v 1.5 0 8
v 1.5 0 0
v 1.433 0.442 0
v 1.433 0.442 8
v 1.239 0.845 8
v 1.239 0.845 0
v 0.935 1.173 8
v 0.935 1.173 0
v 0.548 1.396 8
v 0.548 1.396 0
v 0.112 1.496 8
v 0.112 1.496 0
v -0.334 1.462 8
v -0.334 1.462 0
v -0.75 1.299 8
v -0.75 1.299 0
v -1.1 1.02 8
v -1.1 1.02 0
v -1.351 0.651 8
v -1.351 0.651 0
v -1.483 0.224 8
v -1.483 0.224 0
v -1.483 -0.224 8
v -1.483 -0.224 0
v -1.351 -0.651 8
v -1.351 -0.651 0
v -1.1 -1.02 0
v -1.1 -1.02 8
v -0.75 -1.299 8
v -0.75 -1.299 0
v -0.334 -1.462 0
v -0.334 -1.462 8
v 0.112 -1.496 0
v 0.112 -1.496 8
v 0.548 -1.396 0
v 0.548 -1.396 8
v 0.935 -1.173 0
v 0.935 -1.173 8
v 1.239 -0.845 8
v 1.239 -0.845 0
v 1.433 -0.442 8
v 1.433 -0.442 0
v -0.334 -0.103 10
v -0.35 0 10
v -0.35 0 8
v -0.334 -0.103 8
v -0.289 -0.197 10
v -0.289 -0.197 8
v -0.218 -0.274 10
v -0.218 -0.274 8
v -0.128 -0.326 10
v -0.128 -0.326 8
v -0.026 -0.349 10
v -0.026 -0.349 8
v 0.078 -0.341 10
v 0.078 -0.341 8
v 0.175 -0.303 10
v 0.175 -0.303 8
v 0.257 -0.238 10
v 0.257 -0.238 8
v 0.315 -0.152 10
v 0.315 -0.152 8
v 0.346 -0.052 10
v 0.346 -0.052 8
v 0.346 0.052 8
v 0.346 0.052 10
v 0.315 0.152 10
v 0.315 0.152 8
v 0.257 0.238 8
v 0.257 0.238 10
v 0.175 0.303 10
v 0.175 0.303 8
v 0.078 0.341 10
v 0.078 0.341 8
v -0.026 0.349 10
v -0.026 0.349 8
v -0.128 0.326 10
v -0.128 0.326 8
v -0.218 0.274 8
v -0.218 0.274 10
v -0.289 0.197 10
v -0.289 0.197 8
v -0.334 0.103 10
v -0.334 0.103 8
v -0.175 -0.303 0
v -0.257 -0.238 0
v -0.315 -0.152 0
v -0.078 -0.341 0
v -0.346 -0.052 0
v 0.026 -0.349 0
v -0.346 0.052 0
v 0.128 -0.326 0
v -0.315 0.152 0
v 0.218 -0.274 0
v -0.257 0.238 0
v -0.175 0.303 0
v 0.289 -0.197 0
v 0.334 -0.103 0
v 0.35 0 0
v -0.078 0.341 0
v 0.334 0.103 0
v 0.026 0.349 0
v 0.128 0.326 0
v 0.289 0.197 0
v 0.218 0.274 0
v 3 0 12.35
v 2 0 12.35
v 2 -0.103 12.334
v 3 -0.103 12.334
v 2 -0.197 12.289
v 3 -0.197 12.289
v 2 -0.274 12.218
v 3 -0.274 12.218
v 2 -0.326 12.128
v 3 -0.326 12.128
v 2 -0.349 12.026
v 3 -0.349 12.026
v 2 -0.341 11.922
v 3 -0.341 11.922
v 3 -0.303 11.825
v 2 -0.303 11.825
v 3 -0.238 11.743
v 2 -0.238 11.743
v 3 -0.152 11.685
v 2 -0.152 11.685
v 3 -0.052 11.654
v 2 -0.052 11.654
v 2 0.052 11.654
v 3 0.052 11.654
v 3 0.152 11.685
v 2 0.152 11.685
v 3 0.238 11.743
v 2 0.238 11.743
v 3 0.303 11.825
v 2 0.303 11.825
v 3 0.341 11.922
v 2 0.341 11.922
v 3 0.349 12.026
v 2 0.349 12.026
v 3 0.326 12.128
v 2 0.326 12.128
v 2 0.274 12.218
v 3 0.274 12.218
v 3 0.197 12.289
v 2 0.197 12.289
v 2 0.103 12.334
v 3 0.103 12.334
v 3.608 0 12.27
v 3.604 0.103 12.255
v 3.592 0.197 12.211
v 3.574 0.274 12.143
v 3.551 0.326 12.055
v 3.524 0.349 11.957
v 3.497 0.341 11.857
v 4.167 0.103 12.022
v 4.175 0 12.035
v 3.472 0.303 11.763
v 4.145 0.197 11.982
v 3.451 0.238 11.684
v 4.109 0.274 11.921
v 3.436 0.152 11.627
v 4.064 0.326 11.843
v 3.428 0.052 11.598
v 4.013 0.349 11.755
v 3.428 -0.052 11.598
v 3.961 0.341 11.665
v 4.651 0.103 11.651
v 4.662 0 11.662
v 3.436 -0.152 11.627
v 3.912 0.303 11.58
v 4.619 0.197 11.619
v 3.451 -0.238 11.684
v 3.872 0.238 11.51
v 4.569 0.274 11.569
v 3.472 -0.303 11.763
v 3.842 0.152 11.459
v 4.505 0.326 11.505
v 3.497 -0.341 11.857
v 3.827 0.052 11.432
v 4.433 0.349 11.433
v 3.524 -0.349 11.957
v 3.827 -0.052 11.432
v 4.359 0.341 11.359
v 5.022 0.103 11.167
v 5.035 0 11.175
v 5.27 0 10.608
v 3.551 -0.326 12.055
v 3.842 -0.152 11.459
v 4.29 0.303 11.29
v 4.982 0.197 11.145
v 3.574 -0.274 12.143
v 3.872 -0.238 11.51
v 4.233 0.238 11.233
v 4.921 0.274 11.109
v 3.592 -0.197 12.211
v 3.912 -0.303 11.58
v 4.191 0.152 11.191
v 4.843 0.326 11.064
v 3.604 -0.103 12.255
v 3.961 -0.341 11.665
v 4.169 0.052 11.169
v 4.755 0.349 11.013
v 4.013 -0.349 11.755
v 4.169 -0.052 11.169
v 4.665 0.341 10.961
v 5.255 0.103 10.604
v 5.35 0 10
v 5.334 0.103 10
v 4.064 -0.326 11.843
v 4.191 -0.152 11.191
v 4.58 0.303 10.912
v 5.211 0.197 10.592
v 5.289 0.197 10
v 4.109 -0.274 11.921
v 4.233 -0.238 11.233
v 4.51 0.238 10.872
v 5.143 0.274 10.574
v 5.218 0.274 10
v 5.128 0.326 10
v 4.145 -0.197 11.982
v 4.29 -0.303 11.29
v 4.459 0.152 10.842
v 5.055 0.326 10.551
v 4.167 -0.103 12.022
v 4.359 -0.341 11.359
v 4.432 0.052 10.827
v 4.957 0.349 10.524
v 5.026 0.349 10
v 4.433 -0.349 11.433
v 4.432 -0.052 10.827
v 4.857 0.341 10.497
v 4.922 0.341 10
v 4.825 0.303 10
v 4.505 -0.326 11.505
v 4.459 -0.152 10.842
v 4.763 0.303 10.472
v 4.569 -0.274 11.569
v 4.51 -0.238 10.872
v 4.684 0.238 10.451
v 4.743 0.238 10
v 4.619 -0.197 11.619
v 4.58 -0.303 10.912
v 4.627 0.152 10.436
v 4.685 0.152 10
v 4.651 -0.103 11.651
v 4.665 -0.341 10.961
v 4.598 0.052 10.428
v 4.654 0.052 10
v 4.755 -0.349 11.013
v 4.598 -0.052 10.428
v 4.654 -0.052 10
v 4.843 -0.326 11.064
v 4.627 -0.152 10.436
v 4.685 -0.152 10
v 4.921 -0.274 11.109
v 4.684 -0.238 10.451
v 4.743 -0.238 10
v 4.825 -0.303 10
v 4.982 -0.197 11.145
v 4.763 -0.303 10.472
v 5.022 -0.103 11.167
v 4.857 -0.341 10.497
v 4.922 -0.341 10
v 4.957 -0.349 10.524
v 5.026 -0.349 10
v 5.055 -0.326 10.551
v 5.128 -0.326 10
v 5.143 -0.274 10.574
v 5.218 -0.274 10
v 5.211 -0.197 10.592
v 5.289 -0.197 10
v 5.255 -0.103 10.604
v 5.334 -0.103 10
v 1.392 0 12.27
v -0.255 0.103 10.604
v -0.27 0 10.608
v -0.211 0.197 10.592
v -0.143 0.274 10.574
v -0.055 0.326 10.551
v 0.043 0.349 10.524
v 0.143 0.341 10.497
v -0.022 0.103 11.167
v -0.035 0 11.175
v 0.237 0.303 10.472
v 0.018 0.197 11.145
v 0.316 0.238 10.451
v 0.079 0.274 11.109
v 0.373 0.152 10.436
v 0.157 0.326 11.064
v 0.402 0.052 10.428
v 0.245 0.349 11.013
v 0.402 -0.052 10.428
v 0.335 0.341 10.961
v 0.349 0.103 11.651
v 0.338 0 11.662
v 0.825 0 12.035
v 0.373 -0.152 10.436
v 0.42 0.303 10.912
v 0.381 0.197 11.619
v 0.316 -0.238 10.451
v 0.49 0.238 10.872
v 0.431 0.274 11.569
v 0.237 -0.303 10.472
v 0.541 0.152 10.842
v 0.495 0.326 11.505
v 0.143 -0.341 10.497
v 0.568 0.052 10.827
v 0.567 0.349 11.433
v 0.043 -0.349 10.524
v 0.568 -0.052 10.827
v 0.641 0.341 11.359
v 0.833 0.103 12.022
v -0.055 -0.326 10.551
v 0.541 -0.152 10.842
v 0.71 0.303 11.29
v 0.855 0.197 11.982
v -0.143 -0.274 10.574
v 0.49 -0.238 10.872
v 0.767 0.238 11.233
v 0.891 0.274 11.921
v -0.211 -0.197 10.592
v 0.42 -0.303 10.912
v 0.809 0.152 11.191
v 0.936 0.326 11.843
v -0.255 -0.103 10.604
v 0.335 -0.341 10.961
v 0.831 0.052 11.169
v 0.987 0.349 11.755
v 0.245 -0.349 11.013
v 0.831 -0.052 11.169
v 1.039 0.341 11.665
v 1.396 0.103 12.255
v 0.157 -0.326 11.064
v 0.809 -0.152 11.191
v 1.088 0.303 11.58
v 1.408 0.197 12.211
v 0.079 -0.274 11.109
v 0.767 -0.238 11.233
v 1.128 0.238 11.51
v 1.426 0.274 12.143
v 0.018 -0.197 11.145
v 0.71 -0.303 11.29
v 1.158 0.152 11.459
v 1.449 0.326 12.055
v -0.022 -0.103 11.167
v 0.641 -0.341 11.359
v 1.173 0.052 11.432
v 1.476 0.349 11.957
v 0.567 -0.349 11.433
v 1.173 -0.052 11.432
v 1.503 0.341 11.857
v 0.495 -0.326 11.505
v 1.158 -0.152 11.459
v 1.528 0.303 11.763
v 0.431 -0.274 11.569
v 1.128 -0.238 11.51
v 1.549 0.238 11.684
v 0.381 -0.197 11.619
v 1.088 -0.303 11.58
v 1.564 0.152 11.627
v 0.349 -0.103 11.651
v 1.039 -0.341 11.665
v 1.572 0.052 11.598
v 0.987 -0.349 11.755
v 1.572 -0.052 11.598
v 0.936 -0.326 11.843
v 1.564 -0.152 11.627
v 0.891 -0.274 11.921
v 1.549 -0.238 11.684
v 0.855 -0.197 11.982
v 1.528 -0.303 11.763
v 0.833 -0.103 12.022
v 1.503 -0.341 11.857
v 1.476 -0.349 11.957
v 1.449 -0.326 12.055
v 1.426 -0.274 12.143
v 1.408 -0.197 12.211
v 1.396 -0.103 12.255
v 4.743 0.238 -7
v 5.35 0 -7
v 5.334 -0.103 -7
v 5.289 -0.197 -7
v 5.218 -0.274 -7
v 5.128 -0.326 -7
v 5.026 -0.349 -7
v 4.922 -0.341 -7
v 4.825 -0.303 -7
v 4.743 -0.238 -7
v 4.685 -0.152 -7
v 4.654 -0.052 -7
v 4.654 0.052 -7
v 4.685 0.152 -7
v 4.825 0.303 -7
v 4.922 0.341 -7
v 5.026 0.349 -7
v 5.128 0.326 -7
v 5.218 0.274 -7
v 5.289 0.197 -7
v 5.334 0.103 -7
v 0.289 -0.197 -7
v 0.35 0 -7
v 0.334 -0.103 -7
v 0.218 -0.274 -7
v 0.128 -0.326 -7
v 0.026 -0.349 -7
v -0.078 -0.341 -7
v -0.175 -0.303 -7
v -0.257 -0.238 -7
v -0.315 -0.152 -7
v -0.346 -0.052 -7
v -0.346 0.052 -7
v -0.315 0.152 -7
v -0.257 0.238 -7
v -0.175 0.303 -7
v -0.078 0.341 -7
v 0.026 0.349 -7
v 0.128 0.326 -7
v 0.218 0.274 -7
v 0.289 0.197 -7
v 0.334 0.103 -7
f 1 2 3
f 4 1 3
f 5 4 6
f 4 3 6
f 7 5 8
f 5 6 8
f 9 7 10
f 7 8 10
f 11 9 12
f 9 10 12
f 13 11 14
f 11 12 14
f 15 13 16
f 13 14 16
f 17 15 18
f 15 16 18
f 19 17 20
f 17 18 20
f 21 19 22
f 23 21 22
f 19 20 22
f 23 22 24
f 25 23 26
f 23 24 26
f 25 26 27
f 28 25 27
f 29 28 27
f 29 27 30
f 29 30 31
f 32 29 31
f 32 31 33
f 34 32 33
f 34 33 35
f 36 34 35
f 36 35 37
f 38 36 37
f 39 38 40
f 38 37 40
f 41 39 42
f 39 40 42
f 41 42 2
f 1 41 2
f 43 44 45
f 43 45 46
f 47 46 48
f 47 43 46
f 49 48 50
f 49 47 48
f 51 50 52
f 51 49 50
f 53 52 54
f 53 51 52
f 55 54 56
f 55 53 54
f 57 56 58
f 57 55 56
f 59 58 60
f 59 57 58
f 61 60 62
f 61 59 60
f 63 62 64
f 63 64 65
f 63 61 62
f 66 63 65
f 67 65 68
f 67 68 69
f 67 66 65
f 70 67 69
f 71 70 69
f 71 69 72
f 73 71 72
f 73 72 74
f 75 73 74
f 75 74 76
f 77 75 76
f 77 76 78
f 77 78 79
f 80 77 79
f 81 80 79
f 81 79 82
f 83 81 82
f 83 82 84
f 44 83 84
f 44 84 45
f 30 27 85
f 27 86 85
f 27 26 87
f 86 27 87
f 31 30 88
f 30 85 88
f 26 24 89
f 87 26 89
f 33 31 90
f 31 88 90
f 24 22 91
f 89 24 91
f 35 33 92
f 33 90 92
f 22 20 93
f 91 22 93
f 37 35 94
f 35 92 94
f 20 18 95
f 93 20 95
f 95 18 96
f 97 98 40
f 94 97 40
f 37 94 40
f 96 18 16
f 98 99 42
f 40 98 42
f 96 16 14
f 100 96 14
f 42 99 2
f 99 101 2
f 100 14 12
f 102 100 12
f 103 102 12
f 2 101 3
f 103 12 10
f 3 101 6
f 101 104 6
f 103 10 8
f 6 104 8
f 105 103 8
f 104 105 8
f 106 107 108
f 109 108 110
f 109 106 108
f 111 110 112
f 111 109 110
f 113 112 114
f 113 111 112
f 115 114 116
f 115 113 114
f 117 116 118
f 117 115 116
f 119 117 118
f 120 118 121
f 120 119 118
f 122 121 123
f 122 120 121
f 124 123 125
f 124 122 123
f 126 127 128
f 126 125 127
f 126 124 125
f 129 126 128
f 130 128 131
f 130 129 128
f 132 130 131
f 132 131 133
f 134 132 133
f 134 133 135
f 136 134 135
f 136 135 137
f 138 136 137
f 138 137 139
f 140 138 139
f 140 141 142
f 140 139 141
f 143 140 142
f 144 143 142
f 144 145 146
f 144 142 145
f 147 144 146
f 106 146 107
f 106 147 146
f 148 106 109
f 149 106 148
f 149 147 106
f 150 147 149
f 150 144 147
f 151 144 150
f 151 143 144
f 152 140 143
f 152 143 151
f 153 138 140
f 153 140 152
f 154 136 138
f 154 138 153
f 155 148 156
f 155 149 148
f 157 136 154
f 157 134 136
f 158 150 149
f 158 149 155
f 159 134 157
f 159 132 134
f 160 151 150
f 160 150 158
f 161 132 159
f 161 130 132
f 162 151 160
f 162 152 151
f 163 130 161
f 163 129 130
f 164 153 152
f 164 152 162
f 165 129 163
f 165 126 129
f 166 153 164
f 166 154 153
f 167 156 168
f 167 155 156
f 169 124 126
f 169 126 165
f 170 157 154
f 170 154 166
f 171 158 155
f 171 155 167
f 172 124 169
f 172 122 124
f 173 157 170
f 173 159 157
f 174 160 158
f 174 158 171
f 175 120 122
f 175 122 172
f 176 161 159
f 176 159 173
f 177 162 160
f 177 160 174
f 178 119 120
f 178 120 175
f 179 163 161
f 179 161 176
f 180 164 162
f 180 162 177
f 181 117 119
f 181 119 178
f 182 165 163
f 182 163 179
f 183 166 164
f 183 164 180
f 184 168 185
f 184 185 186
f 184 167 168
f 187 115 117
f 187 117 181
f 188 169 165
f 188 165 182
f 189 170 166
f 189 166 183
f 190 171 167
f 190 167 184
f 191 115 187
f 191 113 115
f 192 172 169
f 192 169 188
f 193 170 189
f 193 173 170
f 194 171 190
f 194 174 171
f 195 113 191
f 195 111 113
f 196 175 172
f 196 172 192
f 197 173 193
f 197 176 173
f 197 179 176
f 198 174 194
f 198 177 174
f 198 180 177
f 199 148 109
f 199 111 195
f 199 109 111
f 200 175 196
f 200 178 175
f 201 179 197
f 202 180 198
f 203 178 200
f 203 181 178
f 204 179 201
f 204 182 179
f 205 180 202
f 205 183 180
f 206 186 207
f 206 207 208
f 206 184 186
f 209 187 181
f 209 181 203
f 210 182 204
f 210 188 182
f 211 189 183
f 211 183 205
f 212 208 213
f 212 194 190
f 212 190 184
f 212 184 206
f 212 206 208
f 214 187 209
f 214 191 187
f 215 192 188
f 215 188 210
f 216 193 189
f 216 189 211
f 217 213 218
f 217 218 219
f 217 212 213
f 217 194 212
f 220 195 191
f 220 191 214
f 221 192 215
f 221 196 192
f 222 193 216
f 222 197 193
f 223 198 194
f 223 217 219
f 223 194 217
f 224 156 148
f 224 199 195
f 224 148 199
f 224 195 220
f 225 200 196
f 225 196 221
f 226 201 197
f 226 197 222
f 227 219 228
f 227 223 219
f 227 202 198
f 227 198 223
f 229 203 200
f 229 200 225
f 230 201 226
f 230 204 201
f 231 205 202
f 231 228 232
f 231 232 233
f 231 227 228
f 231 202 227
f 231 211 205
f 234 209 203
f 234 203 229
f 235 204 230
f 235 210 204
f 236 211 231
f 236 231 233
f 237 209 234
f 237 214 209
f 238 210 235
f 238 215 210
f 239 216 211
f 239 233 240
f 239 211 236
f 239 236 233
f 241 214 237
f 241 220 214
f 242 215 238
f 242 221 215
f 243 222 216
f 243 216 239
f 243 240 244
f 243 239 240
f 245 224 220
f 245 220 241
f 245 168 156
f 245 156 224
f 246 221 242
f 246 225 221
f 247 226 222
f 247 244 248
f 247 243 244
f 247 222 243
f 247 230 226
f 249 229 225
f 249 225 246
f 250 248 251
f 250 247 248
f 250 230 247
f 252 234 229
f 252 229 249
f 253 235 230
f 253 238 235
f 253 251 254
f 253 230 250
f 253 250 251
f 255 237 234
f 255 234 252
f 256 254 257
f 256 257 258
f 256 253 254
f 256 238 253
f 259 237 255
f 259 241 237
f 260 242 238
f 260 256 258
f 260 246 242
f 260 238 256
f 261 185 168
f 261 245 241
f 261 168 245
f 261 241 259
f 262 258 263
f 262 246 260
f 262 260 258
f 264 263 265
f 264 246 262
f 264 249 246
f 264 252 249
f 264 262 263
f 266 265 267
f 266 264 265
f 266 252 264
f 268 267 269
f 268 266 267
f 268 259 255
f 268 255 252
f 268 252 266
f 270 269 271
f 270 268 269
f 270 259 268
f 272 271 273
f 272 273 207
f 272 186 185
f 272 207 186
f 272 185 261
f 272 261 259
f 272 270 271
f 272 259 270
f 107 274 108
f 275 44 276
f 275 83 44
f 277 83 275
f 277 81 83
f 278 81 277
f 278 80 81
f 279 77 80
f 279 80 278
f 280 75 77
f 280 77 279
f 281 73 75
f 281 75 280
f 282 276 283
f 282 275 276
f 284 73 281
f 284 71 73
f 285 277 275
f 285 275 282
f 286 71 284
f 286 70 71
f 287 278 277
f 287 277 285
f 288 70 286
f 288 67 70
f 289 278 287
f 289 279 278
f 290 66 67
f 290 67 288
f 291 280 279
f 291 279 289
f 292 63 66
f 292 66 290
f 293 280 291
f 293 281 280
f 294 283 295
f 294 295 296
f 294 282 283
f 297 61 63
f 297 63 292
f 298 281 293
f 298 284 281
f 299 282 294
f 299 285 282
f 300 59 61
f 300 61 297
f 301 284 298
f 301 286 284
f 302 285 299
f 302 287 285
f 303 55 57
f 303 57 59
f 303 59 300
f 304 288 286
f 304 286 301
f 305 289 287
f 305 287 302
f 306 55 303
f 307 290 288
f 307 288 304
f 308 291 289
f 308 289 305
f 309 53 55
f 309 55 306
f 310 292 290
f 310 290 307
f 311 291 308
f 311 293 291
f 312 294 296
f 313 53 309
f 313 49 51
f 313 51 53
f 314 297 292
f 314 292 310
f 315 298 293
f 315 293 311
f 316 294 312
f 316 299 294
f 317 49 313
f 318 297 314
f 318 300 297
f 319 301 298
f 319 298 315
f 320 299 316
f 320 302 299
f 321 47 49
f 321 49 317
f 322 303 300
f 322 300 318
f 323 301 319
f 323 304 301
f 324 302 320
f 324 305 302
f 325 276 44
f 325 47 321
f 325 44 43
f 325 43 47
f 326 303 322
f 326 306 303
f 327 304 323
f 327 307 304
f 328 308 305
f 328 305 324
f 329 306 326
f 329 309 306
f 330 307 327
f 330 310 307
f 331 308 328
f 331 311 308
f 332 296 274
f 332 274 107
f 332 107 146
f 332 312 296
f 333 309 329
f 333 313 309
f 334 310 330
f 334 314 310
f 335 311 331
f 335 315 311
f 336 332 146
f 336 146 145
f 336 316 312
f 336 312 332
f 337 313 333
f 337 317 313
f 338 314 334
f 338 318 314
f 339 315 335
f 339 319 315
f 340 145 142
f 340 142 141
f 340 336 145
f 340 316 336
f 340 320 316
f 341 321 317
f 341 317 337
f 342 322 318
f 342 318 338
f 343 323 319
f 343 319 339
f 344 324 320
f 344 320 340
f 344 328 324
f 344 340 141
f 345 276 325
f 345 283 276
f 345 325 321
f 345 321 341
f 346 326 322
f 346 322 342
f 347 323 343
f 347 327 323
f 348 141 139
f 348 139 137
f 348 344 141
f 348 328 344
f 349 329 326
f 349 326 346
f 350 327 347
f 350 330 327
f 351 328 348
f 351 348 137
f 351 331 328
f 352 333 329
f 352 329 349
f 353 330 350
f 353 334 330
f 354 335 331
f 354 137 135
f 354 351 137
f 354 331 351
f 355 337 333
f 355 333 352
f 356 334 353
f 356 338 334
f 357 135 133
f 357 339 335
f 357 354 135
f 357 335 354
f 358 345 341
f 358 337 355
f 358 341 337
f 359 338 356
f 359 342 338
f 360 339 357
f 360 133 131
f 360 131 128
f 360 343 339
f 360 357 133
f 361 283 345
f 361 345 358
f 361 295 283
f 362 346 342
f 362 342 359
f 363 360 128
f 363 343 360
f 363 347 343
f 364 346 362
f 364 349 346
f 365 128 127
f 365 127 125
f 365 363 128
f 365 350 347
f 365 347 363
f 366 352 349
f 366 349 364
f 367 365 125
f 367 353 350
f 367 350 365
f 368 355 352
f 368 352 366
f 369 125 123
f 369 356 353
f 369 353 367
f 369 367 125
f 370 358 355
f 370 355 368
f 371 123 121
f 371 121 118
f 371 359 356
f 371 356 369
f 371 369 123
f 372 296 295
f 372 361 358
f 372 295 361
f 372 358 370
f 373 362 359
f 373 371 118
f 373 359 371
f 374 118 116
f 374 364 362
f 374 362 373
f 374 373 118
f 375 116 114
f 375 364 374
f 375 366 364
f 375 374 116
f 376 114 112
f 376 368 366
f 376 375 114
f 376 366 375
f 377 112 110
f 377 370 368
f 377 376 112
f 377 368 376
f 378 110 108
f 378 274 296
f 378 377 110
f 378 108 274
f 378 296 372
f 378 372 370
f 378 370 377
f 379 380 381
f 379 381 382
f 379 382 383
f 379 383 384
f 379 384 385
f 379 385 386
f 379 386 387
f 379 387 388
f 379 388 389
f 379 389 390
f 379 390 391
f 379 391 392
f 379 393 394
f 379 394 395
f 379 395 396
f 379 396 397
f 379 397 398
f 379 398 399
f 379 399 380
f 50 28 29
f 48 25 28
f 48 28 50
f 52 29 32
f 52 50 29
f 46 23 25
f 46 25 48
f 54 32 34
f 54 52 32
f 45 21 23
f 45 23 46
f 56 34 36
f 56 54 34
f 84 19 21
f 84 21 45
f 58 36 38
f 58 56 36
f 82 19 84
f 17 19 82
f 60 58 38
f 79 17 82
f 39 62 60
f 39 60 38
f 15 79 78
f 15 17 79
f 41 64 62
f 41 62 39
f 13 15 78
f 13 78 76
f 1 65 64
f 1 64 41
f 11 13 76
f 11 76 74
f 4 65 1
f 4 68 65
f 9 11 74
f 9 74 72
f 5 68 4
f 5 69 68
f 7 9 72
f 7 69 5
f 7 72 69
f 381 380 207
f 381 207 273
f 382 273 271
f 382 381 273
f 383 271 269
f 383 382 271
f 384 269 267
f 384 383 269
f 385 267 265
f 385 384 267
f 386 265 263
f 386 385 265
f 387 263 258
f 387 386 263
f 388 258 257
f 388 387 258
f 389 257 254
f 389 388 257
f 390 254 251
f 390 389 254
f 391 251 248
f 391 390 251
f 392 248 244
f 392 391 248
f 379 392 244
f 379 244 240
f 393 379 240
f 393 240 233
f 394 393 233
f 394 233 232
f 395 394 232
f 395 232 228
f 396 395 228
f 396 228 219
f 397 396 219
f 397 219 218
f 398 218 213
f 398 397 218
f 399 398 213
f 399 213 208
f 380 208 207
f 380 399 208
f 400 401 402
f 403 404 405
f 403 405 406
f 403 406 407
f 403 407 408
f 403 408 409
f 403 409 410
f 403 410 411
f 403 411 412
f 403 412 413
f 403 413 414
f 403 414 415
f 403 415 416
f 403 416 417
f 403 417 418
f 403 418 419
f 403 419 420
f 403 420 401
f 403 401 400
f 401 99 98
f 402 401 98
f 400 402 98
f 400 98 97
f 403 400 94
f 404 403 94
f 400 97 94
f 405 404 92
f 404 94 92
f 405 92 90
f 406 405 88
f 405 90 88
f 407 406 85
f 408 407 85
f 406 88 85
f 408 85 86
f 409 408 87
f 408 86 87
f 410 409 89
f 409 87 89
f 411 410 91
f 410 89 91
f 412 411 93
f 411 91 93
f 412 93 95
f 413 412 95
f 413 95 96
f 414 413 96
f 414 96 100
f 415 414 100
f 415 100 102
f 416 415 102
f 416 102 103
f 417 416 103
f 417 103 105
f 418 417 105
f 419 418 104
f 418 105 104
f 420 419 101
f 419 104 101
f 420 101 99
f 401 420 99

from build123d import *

# Parameters (mm, degrees)
SKETCH2_R           = 1.5
RESISTOR_BODY_DEPTH = 8
LEAD1_PROFILE_R     = 0.35
SKETCH6_R           = 0.35
LEAD2_DEPTH         = 7


with BuildPart() as part:
    # Sketch2 → Resistor Body (new body)
    with BuildSketch(Plane.XY):
        Circle(SKETCH2_R)
    extrude(amount=RESISTOR_BODY_DEPTH)

    # Lead1: sweep along a path in Lead1 Path
    with BuildLine(Plane(origin=(0, 0, 0), x_dir=(1, 0, 0), z_dir=(0, 1, 0))) as lead1_path:
        Line((0, -8), (0, -10))
        ThreePointArc((0, -10), (0.585786438, -11.414213562), (2, -12))
        Line((2, -12), (3, -12))
        ThreePointArc((3, -12), (4.414213562, -11.414213562), (5, -10))
        Line((5, -10), (5, 7))
    # Lead1 Profile → Lead1 (sweep)
    with BuildSketch(Plane(origin=(0, 0, 8), x_dir=(-1, 0, 0), z_dir=(0, 0, 1))):
        Circle(LEAD1_PROFILE_R)
    sweep(path=lead1_path.line)

    # Sketch6 → Lead2 (add)
    with BuildSketch(Plane(origin=(0, 0, 0), x_dir=(1, 0, 0), z_dir=(0, 0, -1))):
        Circle(SKETCH6_R)
    extrude(amount=LEAD2_DEPTH)


solid = part.part
